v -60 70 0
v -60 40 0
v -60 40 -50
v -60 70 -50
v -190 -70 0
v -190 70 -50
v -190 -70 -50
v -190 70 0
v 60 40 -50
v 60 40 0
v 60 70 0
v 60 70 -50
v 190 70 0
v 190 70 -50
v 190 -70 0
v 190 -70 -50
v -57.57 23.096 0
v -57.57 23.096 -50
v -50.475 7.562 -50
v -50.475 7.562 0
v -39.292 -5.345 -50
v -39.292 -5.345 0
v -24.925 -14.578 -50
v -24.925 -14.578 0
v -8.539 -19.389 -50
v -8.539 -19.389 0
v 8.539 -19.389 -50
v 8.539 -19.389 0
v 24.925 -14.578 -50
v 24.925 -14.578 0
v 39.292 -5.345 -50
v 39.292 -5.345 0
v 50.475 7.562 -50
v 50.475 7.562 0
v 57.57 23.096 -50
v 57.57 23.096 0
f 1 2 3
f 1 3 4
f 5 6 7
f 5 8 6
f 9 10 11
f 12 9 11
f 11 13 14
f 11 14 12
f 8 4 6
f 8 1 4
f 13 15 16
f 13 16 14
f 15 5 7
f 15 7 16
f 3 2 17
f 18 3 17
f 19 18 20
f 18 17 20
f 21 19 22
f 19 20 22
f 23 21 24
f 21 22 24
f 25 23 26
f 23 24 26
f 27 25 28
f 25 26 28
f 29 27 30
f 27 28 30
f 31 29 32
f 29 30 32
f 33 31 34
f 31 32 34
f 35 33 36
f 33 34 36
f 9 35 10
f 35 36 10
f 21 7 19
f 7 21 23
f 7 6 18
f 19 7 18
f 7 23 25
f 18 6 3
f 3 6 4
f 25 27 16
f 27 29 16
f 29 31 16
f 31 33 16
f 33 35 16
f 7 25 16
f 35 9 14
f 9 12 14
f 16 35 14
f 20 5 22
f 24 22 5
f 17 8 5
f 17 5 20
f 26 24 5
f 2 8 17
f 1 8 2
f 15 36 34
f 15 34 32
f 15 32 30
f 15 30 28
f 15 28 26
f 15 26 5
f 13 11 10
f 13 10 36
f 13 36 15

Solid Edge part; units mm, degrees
sketch "Sketch1" plane through (0, 0, 0) normal (0, 0, 1) x (1, 0, 0)
  line L0 (-190, -70) -> (190, -70)
  line L1 (190, -70) -> (190, 70)
  line L2 (190, 70) -> (-190, 70)
  line L3 (-190, 70) -> (-190, -70)
extrude "Protrusion1" add sketch "Sketch1" against normal blind 50
sketch "Sketch2" plane through (0, 0, 0) normal (0, 0, 1) x (1, 0, 0)
  circle A0 centre (0, 40) radius 60
extrude "Recorte_Extrudado_1" cut sketch "Sketch2" against normal blind 50
sketch "Sketch3" plane through (0, 0, 0) normal (0, 0, 1) x (1, 0, 0)
  line L0 (-60, 40) -> (-60, 70)
  line L1 (60, 70) -> (-60, 70)
  line L2 (60, 40) -> (60, 70)
  line L3 (-60, 40) -> (60, 40)
extrude "Recorte_Extrudado_2" cut sketch "Sketch3" against normal blind 50
